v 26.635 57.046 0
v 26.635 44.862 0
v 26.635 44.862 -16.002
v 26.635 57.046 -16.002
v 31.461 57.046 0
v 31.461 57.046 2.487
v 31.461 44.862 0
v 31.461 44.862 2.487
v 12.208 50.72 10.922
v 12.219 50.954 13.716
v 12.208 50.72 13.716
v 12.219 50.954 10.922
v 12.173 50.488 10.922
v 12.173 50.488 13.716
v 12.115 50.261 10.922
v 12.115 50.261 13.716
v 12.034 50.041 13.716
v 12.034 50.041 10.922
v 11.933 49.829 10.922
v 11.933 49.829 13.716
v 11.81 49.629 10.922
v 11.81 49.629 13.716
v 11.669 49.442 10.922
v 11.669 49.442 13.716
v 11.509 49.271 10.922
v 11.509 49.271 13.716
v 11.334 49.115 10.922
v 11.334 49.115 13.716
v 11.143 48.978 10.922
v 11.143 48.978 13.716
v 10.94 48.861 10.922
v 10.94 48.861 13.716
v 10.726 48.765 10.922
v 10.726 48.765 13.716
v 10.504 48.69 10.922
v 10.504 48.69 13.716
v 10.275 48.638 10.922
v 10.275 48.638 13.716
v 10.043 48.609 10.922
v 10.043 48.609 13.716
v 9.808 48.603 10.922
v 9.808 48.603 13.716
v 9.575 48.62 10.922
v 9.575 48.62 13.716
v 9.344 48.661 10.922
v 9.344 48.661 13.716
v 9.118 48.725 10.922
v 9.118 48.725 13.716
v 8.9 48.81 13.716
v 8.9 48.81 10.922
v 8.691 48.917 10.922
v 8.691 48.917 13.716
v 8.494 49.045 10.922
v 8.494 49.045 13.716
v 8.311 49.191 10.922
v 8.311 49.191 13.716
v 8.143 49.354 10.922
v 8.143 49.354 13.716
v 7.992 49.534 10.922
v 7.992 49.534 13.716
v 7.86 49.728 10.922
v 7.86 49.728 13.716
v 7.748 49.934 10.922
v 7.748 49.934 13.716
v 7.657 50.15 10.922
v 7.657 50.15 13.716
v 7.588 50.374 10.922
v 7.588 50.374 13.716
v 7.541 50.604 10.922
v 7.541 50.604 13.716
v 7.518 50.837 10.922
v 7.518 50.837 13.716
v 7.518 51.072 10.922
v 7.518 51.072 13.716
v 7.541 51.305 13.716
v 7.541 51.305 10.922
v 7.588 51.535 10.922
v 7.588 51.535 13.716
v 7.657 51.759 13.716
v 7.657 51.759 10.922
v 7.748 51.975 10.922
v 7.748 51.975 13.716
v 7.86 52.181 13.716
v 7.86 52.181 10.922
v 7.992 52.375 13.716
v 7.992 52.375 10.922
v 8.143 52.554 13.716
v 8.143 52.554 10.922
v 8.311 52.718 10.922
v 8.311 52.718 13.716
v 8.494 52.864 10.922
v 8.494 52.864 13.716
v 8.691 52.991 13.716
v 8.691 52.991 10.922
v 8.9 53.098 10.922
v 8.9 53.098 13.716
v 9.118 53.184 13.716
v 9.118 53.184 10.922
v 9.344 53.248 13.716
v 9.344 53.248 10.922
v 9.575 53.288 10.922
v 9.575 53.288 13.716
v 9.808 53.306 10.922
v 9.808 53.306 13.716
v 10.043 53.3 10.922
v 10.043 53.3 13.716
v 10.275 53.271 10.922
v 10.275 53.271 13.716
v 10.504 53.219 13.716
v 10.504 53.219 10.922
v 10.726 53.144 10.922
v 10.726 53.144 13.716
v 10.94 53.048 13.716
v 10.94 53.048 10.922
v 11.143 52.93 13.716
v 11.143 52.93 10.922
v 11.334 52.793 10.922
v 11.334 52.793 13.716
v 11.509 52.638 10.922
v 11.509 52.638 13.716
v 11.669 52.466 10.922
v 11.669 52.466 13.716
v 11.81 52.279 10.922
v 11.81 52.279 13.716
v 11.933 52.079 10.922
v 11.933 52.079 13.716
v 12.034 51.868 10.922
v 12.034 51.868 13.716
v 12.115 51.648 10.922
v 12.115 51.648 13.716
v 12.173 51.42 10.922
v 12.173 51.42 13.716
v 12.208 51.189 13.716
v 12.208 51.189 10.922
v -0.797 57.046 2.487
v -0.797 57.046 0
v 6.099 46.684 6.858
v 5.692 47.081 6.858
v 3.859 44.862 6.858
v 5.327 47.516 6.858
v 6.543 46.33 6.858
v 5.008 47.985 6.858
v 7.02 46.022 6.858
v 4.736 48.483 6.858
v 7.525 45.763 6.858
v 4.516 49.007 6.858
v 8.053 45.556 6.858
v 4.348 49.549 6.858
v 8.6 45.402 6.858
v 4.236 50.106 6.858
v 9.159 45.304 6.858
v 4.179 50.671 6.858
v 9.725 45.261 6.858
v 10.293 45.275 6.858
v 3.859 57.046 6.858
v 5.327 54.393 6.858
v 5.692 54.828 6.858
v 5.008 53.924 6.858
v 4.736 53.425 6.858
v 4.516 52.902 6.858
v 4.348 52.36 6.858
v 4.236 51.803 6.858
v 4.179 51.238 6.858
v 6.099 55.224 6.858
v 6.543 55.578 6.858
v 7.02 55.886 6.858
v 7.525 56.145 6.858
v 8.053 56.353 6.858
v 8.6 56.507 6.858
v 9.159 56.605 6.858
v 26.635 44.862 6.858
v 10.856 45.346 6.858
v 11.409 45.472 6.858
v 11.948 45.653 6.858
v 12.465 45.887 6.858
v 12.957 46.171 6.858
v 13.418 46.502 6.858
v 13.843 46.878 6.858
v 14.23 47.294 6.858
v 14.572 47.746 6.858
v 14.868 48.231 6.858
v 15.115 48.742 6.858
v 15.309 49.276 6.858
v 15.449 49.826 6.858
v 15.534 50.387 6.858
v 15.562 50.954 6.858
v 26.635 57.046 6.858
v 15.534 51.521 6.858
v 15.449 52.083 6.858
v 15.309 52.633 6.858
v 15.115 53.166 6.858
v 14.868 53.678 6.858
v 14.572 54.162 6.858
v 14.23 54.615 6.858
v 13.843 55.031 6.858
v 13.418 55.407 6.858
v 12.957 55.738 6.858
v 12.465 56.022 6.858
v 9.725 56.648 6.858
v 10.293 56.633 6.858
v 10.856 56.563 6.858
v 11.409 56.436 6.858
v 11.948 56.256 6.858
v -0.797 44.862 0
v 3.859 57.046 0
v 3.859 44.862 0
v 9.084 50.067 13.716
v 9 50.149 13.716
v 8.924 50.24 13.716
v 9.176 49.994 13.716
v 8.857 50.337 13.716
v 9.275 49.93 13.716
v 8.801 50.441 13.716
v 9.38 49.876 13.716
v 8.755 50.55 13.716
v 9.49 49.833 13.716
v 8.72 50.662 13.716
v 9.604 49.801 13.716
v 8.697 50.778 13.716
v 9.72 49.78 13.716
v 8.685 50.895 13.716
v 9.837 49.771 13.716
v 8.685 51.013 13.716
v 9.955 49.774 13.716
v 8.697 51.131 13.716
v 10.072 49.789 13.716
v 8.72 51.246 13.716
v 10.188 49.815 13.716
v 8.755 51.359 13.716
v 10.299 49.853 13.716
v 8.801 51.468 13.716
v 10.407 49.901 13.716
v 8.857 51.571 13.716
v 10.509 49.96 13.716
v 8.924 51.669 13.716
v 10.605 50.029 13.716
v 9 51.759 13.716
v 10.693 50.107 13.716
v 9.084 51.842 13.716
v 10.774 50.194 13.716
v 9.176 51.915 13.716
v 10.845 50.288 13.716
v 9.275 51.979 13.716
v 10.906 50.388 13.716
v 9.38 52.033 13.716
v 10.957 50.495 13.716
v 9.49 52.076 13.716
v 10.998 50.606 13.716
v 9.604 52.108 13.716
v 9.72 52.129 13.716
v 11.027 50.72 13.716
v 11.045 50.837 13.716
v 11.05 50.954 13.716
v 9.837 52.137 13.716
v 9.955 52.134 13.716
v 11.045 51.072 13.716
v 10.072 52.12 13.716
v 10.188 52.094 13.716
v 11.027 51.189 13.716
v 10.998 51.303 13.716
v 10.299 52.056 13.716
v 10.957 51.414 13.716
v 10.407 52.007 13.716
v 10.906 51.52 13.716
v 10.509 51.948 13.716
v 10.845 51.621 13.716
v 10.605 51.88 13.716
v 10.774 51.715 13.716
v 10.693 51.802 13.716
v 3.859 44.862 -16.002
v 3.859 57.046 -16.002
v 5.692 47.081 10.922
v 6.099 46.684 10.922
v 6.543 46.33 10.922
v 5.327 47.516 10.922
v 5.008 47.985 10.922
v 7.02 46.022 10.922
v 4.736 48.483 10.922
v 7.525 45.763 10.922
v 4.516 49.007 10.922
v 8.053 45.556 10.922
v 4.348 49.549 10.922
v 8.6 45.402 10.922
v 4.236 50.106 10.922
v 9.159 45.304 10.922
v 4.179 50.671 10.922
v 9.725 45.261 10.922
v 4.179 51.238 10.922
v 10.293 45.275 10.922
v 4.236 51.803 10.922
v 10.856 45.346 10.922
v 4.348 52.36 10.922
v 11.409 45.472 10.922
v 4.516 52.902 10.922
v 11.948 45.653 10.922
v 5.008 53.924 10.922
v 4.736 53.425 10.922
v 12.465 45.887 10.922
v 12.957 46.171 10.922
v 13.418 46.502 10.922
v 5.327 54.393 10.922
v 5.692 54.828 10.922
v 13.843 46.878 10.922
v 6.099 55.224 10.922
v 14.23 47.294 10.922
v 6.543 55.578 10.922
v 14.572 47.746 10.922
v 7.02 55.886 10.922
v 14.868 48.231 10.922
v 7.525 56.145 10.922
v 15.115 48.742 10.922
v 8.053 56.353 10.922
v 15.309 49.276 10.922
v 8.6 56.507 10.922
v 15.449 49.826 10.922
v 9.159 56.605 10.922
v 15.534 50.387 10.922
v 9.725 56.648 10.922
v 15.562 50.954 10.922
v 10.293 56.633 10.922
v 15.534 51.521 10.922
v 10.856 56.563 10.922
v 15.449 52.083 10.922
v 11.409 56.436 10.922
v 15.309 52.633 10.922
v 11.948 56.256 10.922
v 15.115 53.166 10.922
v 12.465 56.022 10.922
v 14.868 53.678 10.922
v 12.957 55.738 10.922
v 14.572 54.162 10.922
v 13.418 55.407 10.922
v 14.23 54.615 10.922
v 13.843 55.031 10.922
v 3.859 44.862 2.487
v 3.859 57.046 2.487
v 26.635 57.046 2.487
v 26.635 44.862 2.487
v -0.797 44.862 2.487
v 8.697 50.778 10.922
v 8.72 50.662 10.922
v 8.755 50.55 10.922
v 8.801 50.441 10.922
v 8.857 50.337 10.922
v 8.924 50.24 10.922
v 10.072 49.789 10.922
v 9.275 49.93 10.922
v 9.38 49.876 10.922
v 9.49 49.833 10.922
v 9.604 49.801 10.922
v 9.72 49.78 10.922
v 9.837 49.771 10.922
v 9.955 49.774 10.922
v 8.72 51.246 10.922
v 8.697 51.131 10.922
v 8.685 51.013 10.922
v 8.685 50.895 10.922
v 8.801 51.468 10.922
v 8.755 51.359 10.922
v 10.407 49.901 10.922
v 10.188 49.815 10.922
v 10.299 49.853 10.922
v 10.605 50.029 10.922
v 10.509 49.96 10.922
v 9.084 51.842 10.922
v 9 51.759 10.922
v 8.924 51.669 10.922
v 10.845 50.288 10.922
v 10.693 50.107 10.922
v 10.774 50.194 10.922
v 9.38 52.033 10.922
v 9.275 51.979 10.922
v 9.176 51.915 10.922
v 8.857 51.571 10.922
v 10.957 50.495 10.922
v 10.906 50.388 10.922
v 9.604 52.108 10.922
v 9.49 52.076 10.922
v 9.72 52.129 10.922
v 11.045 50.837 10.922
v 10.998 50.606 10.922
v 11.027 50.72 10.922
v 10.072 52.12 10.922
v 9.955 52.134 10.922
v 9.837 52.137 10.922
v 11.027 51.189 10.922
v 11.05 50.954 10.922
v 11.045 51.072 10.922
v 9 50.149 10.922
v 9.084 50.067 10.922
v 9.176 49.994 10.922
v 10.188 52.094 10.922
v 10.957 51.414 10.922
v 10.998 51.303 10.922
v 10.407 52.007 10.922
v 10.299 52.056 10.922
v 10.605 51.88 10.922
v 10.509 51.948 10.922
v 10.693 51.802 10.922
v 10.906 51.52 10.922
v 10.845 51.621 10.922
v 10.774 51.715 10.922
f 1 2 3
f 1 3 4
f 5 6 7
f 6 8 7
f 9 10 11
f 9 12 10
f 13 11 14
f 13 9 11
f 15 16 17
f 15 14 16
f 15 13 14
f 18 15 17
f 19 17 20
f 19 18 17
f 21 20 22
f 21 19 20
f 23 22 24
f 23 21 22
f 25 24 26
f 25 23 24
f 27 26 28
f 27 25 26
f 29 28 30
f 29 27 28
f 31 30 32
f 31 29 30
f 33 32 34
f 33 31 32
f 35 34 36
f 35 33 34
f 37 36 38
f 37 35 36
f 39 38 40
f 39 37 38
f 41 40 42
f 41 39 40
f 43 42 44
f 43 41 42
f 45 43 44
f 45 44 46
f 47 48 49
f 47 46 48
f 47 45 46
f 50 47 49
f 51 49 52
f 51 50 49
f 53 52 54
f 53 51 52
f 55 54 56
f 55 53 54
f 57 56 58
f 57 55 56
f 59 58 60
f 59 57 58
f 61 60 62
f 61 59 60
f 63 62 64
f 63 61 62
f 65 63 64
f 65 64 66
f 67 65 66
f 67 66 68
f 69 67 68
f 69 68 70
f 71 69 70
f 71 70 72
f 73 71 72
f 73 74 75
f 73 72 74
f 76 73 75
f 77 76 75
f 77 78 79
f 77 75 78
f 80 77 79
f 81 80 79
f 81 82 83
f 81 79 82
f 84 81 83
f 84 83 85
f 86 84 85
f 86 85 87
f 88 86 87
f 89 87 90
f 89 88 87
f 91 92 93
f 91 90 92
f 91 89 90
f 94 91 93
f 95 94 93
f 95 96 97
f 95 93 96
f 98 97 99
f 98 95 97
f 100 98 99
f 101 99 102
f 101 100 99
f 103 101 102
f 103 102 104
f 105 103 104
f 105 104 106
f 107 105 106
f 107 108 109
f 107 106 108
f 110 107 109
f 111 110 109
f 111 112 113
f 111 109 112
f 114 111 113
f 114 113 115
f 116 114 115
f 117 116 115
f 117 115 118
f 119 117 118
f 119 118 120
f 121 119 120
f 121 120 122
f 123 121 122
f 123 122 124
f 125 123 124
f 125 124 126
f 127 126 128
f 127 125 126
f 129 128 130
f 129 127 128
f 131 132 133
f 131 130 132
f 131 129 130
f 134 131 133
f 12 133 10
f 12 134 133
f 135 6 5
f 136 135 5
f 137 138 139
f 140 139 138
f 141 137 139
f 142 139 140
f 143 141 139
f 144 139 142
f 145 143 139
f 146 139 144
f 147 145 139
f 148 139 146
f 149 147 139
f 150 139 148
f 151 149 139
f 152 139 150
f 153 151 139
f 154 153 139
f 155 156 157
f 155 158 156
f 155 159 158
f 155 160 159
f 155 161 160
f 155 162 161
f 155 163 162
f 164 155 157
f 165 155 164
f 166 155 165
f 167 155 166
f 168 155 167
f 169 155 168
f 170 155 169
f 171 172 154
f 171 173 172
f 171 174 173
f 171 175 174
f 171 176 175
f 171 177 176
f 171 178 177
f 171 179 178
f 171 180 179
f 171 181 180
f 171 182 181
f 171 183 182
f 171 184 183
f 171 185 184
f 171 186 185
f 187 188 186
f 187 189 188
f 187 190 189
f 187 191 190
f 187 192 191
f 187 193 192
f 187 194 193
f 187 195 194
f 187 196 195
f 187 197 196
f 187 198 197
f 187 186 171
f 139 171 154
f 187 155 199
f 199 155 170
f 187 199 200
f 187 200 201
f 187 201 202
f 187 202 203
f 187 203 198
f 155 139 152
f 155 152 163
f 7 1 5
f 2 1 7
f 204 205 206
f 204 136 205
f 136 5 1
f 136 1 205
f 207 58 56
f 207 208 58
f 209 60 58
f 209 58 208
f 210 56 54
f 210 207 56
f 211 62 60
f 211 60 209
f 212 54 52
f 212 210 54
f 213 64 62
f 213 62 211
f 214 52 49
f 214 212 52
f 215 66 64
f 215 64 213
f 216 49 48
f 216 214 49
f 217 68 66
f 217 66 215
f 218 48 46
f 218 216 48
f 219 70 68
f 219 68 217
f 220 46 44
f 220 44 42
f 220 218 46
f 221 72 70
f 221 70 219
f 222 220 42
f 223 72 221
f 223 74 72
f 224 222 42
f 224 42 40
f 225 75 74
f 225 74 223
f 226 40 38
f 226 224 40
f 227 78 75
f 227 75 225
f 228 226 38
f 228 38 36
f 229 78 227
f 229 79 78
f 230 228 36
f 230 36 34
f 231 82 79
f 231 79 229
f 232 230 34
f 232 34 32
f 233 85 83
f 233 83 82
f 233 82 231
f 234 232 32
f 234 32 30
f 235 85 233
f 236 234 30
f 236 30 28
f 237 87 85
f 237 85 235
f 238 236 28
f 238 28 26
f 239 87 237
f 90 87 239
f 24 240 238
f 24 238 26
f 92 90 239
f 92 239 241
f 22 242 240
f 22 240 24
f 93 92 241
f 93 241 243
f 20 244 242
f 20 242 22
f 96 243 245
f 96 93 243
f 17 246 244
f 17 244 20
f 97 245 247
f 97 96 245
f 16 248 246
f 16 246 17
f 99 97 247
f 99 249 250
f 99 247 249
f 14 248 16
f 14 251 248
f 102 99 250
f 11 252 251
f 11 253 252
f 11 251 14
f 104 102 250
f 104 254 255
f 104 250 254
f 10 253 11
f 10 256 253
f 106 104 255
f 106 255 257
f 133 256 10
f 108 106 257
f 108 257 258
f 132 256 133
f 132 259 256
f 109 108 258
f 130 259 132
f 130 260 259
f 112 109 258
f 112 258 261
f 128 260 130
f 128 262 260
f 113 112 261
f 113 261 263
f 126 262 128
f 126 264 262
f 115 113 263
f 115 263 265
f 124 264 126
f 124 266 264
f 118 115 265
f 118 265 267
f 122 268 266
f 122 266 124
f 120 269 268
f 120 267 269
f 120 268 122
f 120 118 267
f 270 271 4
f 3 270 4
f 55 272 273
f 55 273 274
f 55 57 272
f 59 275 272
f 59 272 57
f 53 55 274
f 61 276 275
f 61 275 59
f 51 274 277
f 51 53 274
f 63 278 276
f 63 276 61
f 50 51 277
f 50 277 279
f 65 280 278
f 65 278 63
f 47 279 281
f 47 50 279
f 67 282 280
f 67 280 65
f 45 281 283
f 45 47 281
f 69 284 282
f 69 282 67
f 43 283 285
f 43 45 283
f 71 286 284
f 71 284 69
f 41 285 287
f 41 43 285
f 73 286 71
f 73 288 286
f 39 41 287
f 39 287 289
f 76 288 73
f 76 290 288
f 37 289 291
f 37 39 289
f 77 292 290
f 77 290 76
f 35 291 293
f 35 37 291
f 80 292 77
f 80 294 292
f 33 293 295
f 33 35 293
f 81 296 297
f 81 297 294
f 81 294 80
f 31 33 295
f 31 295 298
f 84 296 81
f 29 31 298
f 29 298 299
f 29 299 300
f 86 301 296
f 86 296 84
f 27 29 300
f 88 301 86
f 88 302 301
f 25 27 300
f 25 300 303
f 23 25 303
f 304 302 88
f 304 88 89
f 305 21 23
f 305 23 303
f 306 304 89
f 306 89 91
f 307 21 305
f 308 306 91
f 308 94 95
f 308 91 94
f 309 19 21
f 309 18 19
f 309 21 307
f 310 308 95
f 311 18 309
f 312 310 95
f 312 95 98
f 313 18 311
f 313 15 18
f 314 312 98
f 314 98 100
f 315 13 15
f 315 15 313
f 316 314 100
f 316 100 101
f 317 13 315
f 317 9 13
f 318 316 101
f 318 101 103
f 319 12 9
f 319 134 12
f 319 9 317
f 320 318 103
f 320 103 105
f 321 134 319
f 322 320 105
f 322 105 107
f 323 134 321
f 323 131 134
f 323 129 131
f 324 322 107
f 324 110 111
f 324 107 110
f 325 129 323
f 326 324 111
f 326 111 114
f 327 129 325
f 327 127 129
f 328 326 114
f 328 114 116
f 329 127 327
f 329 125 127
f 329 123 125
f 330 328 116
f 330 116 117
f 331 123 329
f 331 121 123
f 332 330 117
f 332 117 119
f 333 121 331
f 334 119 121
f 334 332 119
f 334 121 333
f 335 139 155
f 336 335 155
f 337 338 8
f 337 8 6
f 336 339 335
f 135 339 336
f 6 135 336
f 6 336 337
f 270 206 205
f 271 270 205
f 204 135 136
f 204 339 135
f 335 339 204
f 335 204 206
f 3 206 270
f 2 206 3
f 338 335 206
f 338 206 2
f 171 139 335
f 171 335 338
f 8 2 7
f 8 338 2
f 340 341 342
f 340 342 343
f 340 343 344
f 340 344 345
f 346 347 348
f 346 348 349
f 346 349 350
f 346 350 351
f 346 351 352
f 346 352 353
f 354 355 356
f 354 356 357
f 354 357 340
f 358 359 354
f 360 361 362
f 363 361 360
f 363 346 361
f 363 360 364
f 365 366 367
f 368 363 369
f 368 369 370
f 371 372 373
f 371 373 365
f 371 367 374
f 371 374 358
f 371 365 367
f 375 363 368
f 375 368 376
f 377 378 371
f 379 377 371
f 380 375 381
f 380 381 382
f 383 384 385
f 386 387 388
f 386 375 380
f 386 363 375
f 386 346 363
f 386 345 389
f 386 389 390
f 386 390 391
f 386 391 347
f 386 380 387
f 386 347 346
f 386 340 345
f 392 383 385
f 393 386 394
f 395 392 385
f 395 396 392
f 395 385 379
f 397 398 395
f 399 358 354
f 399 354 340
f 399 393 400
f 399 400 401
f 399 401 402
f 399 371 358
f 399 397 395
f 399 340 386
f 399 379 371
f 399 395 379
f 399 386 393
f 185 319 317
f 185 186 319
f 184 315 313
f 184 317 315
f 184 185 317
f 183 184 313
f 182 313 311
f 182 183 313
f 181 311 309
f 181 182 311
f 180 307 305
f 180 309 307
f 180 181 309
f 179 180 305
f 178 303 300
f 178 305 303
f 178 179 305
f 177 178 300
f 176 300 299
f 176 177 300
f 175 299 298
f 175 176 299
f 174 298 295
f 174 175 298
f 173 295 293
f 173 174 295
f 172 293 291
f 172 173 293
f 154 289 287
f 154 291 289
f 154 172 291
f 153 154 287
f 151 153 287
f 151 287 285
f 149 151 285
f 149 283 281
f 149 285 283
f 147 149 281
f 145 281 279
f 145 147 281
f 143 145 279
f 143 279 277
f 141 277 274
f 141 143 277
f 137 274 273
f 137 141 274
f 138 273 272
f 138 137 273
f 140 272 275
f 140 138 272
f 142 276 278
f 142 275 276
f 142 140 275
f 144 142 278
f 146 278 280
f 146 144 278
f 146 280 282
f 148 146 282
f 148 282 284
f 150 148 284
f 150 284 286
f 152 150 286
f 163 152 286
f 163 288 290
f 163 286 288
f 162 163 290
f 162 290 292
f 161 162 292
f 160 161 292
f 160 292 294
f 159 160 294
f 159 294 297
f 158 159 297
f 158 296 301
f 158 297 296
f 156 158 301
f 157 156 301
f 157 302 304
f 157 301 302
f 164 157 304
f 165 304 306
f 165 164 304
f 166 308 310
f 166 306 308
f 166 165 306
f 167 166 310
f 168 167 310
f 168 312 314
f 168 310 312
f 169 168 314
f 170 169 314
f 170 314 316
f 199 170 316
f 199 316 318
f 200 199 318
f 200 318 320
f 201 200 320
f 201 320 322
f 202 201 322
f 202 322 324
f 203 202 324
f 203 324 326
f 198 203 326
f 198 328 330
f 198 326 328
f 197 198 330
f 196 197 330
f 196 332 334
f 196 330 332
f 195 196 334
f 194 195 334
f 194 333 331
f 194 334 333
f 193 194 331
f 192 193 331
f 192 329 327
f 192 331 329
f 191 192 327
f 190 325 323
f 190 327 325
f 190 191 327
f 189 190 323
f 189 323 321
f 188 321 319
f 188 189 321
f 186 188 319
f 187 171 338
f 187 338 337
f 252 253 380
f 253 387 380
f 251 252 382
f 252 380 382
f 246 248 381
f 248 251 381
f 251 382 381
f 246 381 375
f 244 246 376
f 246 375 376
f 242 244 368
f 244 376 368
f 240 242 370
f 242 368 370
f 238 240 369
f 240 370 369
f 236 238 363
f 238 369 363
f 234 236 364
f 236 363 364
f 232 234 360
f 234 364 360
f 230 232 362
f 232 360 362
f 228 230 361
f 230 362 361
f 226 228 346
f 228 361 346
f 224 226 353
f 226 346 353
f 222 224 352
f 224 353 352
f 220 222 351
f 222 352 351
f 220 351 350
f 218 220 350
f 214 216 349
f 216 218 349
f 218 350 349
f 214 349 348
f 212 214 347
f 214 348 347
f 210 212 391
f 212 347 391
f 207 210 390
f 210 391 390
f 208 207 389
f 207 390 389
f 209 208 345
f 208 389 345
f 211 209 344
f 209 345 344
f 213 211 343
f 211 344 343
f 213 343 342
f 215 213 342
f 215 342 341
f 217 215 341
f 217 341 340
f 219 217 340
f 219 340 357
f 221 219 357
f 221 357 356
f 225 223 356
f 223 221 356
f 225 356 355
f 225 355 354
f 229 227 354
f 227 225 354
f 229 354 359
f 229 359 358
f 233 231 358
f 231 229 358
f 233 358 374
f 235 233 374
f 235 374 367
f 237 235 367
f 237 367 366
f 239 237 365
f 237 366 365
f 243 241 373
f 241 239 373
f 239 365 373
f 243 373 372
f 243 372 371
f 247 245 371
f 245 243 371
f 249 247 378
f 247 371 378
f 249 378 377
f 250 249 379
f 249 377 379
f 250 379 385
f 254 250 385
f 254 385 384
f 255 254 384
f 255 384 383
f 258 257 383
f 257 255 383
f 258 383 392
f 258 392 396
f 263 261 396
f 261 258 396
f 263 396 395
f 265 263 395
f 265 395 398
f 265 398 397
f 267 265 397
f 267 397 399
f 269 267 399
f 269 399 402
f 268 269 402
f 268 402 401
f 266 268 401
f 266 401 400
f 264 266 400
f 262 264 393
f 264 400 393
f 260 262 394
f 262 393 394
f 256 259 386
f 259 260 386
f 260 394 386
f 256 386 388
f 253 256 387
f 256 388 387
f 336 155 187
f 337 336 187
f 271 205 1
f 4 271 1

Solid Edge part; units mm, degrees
sketch "Sketch1" plane through (0, 0, 0) normal (0, 0, 1) x (1, 0, 0)
  line L0 (3.8592, 44.8625) -> (26.6354, 44.8625)
  line L1 (26.6354, 44.8625) -> (26.6354, 57.0462)
  line L2 (3.8592, 57.0462) -> (26.6354, 57.0462)
  line L3 (3.8592, 44.8625) -> (3.8592, 57.0462)
extrude "Ajout_matière_1" add sketch "Sketch1" against normal blind 16.002 and the other way blind 6.858
sketch "Sketch2" plane through (26.6354, 50.9544, -4.572) normal (1, 0, 0) x (0, 1, 0)
  line L0 (-5.4864, 7.0592) -> (6.0919, 7.0592)
  line L1 (6.0919, 7.0592) -> (6.0919, 4.572)
  line L2 (6.0919, 4.572) -> (-6.0919, 4.572)
  line L3 (-6.0919, 4.572) -> (-6.0919, 7.0592)
  line L4 (-6.0919, 7.0592) -> (-5.4864, 7.0592)
extrude "Ajout_matière_2" add sketch "Sketch2" along normal blind 4.826 and the other way blind 27.432
sketch "Sketch3" plane through (15.2473, 50.9544, 6.858) normal (0, 0, 1) x (1, 0, 0)
  circle A0 centre (-5.3803, 0) radius 5.6949
extrude "Ajout_matière_3" add sketch "Sketch3" along normal blind 4.064
sketch "Sketch4" plane through (9.867, 50.9544, 10.922) normal (0, 0, 1) x (1, 0, 0)
  circle A0 centre (0, 0) radius 2.3522
  circle A1 centre (0, 0) radius 1.1834
extrude "Ajout_matière_4" add sketch "Sketch4" along normal blind 2.794
properties part number "AC_1.14"
